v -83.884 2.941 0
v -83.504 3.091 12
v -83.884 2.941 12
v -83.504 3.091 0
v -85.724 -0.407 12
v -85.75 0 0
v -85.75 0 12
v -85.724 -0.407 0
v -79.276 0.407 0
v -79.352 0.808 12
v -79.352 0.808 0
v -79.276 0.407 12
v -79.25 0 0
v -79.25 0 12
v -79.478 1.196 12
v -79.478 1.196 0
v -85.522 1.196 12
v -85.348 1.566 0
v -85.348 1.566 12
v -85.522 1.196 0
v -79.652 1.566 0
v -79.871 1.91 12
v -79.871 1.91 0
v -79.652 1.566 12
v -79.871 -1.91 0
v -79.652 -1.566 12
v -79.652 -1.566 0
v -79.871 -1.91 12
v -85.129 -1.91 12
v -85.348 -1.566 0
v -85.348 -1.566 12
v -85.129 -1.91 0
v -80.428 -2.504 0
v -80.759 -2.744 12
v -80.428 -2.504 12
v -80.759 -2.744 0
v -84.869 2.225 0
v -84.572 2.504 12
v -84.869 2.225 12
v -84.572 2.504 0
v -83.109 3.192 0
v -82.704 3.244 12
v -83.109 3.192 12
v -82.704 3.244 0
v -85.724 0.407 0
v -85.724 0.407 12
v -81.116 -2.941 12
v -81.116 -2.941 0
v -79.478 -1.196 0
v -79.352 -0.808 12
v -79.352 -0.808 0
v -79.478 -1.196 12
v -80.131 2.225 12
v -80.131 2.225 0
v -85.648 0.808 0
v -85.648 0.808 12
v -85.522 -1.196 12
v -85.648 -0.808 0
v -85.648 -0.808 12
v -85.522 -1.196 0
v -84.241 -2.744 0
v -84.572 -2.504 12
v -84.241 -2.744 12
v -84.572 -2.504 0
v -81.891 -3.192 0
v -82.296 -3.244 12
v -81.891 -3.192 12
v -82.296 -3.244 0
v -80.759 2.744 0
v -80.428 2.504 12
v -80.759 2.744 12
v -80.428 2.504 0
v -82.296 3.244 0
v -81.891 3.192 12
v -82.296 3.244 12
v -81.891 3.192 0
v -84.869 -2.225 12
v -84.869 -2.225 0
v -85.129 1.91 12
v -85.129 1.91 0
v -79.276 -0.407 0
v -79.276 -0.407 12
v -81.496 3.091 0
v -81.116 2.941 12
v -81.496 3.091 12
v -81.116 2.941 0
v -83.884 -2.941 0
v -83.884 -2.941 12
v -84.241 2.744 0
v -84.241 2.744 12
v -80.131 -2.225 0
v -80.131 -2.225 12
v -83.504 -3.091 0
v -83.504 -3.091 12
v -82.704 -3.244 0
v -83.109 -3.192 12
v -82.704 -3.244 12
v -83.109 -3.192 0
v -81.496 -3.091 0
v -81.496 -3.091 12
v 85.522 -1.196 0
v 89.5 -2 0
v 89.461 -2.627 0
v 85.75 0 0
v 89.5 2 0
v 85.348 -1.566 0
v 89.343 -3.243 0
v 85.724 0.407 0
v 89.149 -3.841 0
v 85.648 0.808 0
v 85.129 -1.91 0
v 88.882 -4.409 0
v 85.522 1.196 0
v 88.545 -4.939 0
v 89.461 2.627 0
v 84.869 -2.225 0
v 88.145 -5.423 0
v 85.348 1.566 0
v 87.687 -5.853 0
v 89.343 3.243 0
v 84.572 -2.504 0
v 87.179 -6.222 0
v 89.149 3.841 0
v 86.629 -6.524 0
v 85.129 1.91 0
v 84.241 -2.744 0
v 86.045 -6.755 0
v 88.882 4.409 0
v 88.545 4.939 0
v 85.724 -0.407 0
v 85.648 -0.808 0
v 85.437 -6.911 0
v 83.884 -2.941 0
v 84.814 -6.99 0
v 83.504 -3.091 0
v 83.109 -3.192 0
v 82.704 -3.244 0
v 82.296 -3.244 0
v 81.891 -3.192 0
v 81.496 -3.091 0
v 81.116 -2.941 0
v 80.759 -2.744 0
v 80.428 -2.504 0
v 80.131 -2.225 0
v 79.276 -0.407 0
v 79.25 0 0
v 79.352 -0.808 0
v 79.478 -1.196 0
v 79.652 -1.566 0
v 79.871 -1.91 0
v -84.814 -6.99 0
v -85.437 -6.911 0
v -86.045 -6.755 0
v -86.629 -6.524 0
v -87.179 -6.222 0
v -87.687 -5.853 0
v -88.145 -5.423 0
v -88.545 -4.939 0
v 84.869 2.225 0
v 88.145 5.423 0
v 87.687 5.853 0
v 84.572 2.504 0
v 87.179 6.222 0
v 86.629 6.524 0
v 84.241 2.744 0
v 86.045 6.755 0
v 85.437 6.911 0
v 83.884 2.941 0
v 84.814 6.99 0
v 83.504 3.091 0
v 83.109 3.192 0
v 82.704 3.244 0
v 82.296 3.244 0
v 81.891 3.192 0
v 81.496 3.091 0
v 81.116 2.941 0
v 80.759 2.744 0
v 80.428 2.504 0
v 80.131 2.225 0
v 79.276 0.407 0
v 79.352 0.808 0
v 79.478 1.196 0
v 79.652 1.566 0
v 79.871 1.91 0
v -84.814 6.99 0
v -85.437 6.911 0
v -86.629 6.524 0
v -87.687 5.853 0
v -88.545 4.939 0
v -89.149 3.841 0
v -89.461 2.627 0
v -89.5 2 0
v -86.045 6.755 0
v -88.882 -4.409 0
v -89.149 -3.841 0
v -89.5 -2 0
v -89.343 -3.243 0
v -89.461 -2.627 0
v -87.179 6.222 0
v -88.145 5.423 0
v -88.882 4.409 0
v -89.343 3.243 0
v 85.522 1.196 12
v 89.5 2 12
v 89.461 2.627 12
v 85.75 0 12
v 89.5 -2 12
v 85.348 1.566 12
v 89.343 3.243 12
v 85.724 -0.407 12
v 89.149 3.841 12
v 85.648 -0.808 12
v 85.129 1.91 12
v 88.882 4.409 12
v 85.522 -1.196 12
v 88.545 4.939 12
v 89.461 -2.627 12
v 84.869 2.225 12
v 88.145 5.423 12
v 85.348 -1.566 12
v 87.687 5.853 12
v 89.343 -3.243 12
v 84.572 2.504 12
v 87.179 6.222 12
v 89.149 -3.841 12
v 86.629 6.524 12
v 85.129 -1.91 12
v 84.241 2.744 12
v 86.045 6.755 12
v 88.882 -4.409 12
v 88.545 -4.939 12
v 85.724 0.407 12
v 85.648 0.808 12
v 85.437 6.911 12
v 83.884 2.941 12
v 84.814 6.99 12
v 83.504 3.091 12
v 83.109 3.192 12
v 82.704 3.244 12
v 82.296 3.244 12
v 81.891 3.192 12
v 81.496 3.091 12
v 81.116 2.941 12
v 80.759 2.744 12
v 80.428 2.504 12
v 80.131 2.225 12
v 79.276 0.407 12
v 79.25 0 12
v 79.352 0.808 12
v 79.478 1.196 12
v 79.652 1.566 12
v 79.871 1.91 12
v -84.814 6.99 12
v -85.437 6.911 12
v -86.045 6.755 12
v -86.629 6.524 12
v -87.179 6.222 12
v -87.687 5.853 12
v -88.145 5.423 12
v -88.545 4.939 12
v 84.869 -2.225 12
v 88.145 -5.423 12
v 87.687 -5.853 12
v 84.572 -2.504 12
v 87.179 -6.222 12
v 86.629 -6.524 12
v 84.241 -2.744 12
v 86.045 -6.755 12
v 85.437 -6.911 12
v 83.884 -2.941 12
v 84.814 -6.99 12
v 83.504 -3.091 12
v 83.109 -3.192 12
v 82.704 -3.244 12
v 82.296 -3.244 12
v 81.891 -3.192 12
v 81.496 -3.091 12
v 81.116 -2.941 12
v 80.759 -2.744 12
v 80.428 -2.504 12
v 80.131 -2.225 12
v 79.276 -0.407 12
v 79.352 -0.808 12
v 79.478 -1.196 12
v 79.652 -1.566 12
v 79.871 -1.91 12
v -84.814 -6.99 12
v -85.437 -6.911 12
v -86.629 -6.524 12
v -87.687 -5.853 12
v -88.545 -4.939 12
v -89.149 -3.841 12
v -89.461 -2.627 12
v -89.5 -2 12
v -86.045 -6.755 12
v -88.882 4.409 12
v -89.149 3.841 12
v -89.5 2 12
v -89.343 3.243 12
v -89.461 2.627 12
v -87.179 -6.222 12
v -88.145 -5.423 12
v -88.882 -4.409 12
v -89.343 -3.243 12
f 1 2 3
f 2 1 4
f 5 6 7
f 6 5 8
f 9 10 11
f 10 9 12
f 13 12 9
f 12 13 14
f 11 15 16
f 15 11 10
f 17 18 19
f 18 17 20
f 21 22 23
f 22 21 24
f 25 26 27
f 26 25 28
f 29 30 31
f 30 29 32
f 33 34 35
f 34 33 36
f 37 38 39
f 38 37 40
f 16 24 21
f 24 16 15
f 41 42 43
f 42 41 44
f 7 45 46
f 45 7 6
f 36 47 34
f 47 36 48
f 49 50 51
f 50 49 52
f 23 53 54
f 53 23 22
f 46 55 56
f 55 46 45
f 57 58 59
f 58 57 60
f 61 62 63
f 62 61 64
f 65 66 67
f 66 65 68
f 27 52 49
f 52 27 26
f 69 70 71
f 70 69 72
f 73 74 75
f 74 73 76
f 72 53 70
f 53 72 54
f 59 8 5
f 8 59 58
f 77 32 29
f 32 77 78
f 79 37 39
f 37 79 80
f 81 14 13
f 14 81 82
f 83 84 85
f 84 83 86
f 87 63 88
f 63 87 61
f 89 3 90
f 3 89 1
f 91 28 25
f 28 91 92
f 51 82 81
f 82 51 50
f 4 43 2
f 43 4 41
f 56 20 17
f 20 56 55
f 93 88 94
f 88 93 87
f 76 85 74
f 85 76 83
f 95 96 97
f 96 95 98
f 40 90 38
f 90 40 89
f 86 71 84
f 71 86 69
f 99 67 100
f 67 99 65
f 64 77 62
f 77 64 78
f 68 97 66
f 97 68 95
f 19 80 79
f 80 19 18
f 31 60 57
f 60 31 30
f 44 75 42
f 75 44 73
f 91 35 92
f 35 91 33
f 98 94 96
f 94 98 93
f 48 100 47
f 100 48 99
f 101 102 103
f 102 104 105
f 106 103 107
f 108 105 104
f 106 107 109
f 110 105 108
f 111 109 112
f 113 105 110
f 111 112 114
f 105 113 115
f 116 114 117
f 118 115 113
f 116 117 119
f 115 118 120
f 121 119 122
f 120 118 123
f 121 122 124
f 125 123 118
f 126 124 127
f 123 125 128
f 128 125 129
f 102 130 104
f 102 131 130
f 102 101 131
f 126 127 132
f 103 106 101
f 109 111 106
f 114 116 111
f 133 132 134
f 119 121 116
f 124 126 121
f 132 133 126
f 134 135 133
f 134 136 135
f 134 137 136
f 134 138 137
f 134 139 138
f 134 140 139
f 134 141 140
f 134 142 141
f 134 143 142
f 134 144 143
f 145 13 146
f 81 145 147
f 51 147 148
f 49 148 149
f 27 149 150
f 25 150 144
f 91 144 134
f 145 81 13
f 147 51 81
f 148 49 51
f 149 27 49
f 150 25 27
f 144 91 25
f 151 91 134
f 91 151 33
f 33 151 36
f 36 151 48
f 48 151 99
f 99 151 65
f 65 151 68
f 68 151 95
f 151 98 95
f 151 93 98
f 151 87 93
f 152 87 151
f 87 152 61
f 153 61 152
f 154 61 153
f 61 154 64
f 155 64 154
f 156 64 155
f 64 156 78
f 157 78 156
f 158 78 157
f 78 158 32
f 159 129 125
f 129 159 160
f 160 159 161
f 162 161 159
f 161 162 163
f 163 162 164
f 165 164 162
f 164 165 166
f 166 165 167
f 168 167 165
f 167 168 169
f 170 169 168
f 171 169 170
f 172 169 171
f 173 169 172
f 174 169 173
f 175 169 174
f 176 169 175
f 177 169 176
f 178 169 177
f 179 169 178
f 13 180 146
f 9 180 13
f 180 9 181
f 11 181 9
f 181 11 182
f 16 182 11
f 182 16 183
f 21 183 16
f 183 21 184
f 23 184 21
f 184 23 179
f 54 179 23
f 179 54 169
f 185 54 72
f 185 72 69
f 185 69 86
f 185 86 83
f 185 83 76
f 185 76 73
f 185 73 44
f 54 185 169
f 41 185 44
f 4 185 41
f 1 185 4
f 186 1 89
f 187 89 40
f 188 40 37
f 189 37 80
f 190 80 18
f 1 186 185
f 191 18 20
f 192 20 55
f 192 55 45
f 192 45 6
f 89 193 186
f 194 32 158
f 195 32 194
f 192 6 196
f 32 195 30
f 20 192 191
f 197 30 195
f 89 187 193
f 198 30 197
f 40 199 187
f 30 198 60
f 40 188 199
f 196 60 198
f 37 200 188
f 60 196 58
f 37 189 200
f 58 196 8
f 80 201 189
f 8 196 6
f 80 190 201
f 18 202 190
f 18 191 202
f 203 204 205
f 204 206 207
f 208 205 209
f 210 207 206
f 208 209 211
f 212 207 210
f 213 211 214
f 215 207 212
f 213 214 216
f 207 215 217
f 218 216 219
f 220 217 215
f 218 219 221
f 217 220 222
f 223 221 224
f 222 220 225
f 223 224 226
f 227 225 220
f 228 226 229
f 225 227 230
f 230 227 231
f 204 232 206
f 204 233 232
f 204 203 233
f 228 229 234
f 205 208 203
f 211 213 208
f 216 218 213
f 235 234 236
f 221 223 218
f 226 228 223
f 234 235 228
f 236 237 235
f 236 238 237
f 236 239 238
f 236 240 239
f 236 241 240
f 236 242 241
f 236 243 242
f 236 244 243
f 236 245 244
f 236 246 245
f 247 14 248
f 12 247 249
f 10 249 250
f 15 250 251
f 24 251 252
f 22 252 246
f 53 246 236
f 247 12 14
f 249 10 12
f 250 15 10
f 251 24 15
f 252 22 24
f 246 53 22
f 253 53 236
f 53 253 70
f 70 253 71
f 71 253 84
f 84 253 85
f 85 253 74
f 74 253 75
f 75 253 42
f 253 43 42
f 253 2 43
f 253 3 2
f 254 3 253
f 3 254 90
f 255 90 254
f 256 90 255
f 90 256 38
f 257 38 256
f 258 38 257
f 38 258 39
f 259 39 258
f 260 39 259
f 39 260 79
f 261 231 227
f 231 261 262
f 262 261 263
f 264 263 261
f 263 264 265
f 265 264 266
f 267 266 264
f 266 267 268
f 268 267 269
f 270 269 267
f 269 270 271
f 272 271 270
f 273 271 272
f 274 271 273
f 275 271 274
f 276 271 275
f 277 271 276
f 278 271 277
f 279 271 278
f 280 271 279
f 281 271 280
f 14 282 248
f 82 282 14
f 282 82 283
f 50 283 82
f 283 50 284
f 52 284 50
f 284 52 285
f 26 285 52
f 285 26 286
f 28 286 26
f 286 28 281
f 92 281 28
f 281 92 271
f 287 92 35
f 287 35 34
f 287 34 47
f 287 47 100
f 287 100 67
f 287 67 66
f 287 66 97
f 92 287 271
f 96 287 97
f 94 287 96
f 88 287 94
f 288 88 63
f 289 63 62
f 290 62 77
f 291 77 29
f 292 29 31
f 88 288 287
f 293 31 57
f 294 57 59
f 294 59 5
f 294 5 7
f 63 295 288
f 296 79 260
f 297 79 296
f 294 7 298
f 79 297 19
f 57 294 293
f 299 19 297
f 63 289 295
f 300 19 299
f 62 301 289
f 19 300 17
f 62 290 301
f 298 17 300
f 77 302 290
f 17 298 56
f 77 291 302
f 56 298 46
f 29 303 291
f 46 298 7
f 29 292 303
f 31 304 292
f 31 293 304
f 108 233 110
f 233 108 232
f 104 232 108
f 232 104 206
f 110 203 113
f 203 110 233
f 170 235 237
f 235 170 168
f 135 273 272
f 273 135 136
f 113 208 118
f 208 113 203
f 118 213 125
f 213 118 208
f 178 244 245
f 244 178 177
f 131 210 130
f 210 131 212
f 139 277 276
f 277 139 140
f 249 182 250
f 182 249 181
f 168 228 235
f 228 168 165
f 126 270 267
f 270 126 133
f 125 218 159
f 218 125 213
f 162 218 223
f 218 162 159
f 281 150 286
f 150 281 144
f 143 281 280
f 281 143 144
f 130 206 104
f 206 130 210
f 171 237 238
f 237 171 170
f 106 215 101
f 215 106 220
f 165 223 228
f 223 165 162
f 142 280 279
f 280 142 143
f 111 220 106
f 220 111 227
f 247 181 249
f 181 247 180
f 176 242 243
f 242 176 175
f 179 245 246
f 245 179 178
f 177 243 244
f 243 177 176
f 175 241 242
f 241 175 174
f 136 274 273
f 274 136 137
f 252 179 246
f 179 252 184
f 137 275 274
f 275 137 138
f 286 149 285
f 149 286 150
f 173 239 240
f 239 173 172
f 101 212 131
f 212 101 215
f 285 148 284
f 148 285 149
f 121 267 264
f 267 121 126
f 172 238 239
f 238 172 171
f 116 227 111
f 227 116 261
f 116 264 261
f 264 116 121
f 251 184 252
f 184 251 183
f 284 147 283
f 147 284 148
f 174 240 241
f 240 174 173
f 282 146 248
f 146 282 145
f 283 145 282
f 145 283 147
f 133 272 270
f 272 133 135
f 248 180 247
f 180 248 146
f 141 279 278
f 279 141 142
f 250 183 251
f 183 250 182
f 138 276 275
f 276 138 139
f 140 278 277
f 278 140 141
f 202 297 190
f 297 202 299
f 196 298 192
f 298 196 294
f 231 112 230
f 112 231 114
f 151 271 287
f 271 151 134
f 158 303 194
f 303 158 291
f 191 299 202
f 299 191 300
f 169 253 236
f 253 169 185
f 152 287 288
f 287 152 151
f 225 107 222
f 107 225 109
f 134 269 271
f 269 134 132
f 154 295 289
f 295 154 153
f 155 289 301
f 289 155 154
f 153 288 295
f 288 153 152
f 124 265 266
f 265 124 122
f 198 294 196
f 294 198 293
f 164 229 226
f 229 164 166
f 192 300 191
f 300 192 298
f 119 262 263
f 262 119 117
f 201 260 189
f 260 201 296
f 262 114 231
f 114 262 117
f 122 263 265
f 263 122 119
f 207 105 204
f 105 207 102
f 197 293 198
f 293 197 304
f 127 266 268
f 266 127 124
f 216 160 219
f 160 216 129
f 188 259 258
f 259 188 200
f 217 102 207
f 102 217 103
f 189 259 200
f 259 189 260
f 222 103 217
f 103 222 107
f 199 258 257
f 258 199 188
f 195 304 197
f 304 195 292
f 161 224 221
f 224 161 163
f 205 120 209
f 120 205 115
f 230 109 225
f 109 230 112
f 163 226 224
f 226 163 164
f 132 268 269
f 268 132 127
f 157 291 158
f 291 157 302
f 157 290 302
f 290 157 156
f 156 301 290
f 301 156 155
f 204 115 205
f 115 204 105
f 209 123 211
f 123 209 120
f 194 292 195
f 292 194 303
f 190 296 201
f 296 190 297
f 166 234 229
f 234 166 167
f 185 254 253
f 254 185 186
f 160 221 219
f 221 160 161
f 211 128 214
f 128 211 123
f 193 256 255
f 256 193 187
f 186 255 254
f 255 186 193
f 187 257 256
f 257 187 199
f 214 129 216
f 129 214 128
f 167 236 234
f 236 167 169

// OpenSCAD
$fn = 50;


difference() {
	union() {
		hull() {
			translate(v = [-84.5000000000, 2.0000000000, 0]) {
				cylinder(h = 12, r = 5);
			}
			translate(v = [84.5000000000, 2.0000000000, 0]) {
				cylinder(h = 12, r = 5);
			}
			translate(v = [-84.5000000000, -2.0000000000, 0]) {
				cylinder(h = 12, r = 5);
			}
			translate(v = [84.5000000000, -2.0000000000, 0]) {
				cylinder(h = 12, r = 5);
			}
		}
	}
	union() {
		translate(v = [-82.5000000000, 0.0000000000, 0]) {
			cylinder(h = 12, r = 3.2500000000);
		}
		translate(v = [82.5000000000, 0.0000000000, 0]) {
			cylinder(h = 12, r = 3.2500000000);
		}
		translate(v = [-82.5000000000, 0.0000000000, 0]) {
			cylinder(h = 12, r = 1.8000000000);
		}
		translate(v = [82.5000000000, 0.0000000000, 0]) {
			cylinder(h = 12, r = 1.8000000000);
		}
		translate(v = [-82.5000000000, 0.0000000000, 0]) {
			cylinder(h = 12, r = 1.8000000000);
		}
		translate(v = [82.5000000000, 0.0000000000, 0]) {
			cylinder(h = 12, r = 1.8000000000);
		}
		translate(v = [-82.5000000000, 0.0000000000, 0]) {
			cylinder(h = 12, r = 1.8000000000);
		}
		translate(v = [82.5000000000, 0.0000000000, 0]) {
			cylinder(h = 12, r = 1.8000000000);
		}
	}
}
